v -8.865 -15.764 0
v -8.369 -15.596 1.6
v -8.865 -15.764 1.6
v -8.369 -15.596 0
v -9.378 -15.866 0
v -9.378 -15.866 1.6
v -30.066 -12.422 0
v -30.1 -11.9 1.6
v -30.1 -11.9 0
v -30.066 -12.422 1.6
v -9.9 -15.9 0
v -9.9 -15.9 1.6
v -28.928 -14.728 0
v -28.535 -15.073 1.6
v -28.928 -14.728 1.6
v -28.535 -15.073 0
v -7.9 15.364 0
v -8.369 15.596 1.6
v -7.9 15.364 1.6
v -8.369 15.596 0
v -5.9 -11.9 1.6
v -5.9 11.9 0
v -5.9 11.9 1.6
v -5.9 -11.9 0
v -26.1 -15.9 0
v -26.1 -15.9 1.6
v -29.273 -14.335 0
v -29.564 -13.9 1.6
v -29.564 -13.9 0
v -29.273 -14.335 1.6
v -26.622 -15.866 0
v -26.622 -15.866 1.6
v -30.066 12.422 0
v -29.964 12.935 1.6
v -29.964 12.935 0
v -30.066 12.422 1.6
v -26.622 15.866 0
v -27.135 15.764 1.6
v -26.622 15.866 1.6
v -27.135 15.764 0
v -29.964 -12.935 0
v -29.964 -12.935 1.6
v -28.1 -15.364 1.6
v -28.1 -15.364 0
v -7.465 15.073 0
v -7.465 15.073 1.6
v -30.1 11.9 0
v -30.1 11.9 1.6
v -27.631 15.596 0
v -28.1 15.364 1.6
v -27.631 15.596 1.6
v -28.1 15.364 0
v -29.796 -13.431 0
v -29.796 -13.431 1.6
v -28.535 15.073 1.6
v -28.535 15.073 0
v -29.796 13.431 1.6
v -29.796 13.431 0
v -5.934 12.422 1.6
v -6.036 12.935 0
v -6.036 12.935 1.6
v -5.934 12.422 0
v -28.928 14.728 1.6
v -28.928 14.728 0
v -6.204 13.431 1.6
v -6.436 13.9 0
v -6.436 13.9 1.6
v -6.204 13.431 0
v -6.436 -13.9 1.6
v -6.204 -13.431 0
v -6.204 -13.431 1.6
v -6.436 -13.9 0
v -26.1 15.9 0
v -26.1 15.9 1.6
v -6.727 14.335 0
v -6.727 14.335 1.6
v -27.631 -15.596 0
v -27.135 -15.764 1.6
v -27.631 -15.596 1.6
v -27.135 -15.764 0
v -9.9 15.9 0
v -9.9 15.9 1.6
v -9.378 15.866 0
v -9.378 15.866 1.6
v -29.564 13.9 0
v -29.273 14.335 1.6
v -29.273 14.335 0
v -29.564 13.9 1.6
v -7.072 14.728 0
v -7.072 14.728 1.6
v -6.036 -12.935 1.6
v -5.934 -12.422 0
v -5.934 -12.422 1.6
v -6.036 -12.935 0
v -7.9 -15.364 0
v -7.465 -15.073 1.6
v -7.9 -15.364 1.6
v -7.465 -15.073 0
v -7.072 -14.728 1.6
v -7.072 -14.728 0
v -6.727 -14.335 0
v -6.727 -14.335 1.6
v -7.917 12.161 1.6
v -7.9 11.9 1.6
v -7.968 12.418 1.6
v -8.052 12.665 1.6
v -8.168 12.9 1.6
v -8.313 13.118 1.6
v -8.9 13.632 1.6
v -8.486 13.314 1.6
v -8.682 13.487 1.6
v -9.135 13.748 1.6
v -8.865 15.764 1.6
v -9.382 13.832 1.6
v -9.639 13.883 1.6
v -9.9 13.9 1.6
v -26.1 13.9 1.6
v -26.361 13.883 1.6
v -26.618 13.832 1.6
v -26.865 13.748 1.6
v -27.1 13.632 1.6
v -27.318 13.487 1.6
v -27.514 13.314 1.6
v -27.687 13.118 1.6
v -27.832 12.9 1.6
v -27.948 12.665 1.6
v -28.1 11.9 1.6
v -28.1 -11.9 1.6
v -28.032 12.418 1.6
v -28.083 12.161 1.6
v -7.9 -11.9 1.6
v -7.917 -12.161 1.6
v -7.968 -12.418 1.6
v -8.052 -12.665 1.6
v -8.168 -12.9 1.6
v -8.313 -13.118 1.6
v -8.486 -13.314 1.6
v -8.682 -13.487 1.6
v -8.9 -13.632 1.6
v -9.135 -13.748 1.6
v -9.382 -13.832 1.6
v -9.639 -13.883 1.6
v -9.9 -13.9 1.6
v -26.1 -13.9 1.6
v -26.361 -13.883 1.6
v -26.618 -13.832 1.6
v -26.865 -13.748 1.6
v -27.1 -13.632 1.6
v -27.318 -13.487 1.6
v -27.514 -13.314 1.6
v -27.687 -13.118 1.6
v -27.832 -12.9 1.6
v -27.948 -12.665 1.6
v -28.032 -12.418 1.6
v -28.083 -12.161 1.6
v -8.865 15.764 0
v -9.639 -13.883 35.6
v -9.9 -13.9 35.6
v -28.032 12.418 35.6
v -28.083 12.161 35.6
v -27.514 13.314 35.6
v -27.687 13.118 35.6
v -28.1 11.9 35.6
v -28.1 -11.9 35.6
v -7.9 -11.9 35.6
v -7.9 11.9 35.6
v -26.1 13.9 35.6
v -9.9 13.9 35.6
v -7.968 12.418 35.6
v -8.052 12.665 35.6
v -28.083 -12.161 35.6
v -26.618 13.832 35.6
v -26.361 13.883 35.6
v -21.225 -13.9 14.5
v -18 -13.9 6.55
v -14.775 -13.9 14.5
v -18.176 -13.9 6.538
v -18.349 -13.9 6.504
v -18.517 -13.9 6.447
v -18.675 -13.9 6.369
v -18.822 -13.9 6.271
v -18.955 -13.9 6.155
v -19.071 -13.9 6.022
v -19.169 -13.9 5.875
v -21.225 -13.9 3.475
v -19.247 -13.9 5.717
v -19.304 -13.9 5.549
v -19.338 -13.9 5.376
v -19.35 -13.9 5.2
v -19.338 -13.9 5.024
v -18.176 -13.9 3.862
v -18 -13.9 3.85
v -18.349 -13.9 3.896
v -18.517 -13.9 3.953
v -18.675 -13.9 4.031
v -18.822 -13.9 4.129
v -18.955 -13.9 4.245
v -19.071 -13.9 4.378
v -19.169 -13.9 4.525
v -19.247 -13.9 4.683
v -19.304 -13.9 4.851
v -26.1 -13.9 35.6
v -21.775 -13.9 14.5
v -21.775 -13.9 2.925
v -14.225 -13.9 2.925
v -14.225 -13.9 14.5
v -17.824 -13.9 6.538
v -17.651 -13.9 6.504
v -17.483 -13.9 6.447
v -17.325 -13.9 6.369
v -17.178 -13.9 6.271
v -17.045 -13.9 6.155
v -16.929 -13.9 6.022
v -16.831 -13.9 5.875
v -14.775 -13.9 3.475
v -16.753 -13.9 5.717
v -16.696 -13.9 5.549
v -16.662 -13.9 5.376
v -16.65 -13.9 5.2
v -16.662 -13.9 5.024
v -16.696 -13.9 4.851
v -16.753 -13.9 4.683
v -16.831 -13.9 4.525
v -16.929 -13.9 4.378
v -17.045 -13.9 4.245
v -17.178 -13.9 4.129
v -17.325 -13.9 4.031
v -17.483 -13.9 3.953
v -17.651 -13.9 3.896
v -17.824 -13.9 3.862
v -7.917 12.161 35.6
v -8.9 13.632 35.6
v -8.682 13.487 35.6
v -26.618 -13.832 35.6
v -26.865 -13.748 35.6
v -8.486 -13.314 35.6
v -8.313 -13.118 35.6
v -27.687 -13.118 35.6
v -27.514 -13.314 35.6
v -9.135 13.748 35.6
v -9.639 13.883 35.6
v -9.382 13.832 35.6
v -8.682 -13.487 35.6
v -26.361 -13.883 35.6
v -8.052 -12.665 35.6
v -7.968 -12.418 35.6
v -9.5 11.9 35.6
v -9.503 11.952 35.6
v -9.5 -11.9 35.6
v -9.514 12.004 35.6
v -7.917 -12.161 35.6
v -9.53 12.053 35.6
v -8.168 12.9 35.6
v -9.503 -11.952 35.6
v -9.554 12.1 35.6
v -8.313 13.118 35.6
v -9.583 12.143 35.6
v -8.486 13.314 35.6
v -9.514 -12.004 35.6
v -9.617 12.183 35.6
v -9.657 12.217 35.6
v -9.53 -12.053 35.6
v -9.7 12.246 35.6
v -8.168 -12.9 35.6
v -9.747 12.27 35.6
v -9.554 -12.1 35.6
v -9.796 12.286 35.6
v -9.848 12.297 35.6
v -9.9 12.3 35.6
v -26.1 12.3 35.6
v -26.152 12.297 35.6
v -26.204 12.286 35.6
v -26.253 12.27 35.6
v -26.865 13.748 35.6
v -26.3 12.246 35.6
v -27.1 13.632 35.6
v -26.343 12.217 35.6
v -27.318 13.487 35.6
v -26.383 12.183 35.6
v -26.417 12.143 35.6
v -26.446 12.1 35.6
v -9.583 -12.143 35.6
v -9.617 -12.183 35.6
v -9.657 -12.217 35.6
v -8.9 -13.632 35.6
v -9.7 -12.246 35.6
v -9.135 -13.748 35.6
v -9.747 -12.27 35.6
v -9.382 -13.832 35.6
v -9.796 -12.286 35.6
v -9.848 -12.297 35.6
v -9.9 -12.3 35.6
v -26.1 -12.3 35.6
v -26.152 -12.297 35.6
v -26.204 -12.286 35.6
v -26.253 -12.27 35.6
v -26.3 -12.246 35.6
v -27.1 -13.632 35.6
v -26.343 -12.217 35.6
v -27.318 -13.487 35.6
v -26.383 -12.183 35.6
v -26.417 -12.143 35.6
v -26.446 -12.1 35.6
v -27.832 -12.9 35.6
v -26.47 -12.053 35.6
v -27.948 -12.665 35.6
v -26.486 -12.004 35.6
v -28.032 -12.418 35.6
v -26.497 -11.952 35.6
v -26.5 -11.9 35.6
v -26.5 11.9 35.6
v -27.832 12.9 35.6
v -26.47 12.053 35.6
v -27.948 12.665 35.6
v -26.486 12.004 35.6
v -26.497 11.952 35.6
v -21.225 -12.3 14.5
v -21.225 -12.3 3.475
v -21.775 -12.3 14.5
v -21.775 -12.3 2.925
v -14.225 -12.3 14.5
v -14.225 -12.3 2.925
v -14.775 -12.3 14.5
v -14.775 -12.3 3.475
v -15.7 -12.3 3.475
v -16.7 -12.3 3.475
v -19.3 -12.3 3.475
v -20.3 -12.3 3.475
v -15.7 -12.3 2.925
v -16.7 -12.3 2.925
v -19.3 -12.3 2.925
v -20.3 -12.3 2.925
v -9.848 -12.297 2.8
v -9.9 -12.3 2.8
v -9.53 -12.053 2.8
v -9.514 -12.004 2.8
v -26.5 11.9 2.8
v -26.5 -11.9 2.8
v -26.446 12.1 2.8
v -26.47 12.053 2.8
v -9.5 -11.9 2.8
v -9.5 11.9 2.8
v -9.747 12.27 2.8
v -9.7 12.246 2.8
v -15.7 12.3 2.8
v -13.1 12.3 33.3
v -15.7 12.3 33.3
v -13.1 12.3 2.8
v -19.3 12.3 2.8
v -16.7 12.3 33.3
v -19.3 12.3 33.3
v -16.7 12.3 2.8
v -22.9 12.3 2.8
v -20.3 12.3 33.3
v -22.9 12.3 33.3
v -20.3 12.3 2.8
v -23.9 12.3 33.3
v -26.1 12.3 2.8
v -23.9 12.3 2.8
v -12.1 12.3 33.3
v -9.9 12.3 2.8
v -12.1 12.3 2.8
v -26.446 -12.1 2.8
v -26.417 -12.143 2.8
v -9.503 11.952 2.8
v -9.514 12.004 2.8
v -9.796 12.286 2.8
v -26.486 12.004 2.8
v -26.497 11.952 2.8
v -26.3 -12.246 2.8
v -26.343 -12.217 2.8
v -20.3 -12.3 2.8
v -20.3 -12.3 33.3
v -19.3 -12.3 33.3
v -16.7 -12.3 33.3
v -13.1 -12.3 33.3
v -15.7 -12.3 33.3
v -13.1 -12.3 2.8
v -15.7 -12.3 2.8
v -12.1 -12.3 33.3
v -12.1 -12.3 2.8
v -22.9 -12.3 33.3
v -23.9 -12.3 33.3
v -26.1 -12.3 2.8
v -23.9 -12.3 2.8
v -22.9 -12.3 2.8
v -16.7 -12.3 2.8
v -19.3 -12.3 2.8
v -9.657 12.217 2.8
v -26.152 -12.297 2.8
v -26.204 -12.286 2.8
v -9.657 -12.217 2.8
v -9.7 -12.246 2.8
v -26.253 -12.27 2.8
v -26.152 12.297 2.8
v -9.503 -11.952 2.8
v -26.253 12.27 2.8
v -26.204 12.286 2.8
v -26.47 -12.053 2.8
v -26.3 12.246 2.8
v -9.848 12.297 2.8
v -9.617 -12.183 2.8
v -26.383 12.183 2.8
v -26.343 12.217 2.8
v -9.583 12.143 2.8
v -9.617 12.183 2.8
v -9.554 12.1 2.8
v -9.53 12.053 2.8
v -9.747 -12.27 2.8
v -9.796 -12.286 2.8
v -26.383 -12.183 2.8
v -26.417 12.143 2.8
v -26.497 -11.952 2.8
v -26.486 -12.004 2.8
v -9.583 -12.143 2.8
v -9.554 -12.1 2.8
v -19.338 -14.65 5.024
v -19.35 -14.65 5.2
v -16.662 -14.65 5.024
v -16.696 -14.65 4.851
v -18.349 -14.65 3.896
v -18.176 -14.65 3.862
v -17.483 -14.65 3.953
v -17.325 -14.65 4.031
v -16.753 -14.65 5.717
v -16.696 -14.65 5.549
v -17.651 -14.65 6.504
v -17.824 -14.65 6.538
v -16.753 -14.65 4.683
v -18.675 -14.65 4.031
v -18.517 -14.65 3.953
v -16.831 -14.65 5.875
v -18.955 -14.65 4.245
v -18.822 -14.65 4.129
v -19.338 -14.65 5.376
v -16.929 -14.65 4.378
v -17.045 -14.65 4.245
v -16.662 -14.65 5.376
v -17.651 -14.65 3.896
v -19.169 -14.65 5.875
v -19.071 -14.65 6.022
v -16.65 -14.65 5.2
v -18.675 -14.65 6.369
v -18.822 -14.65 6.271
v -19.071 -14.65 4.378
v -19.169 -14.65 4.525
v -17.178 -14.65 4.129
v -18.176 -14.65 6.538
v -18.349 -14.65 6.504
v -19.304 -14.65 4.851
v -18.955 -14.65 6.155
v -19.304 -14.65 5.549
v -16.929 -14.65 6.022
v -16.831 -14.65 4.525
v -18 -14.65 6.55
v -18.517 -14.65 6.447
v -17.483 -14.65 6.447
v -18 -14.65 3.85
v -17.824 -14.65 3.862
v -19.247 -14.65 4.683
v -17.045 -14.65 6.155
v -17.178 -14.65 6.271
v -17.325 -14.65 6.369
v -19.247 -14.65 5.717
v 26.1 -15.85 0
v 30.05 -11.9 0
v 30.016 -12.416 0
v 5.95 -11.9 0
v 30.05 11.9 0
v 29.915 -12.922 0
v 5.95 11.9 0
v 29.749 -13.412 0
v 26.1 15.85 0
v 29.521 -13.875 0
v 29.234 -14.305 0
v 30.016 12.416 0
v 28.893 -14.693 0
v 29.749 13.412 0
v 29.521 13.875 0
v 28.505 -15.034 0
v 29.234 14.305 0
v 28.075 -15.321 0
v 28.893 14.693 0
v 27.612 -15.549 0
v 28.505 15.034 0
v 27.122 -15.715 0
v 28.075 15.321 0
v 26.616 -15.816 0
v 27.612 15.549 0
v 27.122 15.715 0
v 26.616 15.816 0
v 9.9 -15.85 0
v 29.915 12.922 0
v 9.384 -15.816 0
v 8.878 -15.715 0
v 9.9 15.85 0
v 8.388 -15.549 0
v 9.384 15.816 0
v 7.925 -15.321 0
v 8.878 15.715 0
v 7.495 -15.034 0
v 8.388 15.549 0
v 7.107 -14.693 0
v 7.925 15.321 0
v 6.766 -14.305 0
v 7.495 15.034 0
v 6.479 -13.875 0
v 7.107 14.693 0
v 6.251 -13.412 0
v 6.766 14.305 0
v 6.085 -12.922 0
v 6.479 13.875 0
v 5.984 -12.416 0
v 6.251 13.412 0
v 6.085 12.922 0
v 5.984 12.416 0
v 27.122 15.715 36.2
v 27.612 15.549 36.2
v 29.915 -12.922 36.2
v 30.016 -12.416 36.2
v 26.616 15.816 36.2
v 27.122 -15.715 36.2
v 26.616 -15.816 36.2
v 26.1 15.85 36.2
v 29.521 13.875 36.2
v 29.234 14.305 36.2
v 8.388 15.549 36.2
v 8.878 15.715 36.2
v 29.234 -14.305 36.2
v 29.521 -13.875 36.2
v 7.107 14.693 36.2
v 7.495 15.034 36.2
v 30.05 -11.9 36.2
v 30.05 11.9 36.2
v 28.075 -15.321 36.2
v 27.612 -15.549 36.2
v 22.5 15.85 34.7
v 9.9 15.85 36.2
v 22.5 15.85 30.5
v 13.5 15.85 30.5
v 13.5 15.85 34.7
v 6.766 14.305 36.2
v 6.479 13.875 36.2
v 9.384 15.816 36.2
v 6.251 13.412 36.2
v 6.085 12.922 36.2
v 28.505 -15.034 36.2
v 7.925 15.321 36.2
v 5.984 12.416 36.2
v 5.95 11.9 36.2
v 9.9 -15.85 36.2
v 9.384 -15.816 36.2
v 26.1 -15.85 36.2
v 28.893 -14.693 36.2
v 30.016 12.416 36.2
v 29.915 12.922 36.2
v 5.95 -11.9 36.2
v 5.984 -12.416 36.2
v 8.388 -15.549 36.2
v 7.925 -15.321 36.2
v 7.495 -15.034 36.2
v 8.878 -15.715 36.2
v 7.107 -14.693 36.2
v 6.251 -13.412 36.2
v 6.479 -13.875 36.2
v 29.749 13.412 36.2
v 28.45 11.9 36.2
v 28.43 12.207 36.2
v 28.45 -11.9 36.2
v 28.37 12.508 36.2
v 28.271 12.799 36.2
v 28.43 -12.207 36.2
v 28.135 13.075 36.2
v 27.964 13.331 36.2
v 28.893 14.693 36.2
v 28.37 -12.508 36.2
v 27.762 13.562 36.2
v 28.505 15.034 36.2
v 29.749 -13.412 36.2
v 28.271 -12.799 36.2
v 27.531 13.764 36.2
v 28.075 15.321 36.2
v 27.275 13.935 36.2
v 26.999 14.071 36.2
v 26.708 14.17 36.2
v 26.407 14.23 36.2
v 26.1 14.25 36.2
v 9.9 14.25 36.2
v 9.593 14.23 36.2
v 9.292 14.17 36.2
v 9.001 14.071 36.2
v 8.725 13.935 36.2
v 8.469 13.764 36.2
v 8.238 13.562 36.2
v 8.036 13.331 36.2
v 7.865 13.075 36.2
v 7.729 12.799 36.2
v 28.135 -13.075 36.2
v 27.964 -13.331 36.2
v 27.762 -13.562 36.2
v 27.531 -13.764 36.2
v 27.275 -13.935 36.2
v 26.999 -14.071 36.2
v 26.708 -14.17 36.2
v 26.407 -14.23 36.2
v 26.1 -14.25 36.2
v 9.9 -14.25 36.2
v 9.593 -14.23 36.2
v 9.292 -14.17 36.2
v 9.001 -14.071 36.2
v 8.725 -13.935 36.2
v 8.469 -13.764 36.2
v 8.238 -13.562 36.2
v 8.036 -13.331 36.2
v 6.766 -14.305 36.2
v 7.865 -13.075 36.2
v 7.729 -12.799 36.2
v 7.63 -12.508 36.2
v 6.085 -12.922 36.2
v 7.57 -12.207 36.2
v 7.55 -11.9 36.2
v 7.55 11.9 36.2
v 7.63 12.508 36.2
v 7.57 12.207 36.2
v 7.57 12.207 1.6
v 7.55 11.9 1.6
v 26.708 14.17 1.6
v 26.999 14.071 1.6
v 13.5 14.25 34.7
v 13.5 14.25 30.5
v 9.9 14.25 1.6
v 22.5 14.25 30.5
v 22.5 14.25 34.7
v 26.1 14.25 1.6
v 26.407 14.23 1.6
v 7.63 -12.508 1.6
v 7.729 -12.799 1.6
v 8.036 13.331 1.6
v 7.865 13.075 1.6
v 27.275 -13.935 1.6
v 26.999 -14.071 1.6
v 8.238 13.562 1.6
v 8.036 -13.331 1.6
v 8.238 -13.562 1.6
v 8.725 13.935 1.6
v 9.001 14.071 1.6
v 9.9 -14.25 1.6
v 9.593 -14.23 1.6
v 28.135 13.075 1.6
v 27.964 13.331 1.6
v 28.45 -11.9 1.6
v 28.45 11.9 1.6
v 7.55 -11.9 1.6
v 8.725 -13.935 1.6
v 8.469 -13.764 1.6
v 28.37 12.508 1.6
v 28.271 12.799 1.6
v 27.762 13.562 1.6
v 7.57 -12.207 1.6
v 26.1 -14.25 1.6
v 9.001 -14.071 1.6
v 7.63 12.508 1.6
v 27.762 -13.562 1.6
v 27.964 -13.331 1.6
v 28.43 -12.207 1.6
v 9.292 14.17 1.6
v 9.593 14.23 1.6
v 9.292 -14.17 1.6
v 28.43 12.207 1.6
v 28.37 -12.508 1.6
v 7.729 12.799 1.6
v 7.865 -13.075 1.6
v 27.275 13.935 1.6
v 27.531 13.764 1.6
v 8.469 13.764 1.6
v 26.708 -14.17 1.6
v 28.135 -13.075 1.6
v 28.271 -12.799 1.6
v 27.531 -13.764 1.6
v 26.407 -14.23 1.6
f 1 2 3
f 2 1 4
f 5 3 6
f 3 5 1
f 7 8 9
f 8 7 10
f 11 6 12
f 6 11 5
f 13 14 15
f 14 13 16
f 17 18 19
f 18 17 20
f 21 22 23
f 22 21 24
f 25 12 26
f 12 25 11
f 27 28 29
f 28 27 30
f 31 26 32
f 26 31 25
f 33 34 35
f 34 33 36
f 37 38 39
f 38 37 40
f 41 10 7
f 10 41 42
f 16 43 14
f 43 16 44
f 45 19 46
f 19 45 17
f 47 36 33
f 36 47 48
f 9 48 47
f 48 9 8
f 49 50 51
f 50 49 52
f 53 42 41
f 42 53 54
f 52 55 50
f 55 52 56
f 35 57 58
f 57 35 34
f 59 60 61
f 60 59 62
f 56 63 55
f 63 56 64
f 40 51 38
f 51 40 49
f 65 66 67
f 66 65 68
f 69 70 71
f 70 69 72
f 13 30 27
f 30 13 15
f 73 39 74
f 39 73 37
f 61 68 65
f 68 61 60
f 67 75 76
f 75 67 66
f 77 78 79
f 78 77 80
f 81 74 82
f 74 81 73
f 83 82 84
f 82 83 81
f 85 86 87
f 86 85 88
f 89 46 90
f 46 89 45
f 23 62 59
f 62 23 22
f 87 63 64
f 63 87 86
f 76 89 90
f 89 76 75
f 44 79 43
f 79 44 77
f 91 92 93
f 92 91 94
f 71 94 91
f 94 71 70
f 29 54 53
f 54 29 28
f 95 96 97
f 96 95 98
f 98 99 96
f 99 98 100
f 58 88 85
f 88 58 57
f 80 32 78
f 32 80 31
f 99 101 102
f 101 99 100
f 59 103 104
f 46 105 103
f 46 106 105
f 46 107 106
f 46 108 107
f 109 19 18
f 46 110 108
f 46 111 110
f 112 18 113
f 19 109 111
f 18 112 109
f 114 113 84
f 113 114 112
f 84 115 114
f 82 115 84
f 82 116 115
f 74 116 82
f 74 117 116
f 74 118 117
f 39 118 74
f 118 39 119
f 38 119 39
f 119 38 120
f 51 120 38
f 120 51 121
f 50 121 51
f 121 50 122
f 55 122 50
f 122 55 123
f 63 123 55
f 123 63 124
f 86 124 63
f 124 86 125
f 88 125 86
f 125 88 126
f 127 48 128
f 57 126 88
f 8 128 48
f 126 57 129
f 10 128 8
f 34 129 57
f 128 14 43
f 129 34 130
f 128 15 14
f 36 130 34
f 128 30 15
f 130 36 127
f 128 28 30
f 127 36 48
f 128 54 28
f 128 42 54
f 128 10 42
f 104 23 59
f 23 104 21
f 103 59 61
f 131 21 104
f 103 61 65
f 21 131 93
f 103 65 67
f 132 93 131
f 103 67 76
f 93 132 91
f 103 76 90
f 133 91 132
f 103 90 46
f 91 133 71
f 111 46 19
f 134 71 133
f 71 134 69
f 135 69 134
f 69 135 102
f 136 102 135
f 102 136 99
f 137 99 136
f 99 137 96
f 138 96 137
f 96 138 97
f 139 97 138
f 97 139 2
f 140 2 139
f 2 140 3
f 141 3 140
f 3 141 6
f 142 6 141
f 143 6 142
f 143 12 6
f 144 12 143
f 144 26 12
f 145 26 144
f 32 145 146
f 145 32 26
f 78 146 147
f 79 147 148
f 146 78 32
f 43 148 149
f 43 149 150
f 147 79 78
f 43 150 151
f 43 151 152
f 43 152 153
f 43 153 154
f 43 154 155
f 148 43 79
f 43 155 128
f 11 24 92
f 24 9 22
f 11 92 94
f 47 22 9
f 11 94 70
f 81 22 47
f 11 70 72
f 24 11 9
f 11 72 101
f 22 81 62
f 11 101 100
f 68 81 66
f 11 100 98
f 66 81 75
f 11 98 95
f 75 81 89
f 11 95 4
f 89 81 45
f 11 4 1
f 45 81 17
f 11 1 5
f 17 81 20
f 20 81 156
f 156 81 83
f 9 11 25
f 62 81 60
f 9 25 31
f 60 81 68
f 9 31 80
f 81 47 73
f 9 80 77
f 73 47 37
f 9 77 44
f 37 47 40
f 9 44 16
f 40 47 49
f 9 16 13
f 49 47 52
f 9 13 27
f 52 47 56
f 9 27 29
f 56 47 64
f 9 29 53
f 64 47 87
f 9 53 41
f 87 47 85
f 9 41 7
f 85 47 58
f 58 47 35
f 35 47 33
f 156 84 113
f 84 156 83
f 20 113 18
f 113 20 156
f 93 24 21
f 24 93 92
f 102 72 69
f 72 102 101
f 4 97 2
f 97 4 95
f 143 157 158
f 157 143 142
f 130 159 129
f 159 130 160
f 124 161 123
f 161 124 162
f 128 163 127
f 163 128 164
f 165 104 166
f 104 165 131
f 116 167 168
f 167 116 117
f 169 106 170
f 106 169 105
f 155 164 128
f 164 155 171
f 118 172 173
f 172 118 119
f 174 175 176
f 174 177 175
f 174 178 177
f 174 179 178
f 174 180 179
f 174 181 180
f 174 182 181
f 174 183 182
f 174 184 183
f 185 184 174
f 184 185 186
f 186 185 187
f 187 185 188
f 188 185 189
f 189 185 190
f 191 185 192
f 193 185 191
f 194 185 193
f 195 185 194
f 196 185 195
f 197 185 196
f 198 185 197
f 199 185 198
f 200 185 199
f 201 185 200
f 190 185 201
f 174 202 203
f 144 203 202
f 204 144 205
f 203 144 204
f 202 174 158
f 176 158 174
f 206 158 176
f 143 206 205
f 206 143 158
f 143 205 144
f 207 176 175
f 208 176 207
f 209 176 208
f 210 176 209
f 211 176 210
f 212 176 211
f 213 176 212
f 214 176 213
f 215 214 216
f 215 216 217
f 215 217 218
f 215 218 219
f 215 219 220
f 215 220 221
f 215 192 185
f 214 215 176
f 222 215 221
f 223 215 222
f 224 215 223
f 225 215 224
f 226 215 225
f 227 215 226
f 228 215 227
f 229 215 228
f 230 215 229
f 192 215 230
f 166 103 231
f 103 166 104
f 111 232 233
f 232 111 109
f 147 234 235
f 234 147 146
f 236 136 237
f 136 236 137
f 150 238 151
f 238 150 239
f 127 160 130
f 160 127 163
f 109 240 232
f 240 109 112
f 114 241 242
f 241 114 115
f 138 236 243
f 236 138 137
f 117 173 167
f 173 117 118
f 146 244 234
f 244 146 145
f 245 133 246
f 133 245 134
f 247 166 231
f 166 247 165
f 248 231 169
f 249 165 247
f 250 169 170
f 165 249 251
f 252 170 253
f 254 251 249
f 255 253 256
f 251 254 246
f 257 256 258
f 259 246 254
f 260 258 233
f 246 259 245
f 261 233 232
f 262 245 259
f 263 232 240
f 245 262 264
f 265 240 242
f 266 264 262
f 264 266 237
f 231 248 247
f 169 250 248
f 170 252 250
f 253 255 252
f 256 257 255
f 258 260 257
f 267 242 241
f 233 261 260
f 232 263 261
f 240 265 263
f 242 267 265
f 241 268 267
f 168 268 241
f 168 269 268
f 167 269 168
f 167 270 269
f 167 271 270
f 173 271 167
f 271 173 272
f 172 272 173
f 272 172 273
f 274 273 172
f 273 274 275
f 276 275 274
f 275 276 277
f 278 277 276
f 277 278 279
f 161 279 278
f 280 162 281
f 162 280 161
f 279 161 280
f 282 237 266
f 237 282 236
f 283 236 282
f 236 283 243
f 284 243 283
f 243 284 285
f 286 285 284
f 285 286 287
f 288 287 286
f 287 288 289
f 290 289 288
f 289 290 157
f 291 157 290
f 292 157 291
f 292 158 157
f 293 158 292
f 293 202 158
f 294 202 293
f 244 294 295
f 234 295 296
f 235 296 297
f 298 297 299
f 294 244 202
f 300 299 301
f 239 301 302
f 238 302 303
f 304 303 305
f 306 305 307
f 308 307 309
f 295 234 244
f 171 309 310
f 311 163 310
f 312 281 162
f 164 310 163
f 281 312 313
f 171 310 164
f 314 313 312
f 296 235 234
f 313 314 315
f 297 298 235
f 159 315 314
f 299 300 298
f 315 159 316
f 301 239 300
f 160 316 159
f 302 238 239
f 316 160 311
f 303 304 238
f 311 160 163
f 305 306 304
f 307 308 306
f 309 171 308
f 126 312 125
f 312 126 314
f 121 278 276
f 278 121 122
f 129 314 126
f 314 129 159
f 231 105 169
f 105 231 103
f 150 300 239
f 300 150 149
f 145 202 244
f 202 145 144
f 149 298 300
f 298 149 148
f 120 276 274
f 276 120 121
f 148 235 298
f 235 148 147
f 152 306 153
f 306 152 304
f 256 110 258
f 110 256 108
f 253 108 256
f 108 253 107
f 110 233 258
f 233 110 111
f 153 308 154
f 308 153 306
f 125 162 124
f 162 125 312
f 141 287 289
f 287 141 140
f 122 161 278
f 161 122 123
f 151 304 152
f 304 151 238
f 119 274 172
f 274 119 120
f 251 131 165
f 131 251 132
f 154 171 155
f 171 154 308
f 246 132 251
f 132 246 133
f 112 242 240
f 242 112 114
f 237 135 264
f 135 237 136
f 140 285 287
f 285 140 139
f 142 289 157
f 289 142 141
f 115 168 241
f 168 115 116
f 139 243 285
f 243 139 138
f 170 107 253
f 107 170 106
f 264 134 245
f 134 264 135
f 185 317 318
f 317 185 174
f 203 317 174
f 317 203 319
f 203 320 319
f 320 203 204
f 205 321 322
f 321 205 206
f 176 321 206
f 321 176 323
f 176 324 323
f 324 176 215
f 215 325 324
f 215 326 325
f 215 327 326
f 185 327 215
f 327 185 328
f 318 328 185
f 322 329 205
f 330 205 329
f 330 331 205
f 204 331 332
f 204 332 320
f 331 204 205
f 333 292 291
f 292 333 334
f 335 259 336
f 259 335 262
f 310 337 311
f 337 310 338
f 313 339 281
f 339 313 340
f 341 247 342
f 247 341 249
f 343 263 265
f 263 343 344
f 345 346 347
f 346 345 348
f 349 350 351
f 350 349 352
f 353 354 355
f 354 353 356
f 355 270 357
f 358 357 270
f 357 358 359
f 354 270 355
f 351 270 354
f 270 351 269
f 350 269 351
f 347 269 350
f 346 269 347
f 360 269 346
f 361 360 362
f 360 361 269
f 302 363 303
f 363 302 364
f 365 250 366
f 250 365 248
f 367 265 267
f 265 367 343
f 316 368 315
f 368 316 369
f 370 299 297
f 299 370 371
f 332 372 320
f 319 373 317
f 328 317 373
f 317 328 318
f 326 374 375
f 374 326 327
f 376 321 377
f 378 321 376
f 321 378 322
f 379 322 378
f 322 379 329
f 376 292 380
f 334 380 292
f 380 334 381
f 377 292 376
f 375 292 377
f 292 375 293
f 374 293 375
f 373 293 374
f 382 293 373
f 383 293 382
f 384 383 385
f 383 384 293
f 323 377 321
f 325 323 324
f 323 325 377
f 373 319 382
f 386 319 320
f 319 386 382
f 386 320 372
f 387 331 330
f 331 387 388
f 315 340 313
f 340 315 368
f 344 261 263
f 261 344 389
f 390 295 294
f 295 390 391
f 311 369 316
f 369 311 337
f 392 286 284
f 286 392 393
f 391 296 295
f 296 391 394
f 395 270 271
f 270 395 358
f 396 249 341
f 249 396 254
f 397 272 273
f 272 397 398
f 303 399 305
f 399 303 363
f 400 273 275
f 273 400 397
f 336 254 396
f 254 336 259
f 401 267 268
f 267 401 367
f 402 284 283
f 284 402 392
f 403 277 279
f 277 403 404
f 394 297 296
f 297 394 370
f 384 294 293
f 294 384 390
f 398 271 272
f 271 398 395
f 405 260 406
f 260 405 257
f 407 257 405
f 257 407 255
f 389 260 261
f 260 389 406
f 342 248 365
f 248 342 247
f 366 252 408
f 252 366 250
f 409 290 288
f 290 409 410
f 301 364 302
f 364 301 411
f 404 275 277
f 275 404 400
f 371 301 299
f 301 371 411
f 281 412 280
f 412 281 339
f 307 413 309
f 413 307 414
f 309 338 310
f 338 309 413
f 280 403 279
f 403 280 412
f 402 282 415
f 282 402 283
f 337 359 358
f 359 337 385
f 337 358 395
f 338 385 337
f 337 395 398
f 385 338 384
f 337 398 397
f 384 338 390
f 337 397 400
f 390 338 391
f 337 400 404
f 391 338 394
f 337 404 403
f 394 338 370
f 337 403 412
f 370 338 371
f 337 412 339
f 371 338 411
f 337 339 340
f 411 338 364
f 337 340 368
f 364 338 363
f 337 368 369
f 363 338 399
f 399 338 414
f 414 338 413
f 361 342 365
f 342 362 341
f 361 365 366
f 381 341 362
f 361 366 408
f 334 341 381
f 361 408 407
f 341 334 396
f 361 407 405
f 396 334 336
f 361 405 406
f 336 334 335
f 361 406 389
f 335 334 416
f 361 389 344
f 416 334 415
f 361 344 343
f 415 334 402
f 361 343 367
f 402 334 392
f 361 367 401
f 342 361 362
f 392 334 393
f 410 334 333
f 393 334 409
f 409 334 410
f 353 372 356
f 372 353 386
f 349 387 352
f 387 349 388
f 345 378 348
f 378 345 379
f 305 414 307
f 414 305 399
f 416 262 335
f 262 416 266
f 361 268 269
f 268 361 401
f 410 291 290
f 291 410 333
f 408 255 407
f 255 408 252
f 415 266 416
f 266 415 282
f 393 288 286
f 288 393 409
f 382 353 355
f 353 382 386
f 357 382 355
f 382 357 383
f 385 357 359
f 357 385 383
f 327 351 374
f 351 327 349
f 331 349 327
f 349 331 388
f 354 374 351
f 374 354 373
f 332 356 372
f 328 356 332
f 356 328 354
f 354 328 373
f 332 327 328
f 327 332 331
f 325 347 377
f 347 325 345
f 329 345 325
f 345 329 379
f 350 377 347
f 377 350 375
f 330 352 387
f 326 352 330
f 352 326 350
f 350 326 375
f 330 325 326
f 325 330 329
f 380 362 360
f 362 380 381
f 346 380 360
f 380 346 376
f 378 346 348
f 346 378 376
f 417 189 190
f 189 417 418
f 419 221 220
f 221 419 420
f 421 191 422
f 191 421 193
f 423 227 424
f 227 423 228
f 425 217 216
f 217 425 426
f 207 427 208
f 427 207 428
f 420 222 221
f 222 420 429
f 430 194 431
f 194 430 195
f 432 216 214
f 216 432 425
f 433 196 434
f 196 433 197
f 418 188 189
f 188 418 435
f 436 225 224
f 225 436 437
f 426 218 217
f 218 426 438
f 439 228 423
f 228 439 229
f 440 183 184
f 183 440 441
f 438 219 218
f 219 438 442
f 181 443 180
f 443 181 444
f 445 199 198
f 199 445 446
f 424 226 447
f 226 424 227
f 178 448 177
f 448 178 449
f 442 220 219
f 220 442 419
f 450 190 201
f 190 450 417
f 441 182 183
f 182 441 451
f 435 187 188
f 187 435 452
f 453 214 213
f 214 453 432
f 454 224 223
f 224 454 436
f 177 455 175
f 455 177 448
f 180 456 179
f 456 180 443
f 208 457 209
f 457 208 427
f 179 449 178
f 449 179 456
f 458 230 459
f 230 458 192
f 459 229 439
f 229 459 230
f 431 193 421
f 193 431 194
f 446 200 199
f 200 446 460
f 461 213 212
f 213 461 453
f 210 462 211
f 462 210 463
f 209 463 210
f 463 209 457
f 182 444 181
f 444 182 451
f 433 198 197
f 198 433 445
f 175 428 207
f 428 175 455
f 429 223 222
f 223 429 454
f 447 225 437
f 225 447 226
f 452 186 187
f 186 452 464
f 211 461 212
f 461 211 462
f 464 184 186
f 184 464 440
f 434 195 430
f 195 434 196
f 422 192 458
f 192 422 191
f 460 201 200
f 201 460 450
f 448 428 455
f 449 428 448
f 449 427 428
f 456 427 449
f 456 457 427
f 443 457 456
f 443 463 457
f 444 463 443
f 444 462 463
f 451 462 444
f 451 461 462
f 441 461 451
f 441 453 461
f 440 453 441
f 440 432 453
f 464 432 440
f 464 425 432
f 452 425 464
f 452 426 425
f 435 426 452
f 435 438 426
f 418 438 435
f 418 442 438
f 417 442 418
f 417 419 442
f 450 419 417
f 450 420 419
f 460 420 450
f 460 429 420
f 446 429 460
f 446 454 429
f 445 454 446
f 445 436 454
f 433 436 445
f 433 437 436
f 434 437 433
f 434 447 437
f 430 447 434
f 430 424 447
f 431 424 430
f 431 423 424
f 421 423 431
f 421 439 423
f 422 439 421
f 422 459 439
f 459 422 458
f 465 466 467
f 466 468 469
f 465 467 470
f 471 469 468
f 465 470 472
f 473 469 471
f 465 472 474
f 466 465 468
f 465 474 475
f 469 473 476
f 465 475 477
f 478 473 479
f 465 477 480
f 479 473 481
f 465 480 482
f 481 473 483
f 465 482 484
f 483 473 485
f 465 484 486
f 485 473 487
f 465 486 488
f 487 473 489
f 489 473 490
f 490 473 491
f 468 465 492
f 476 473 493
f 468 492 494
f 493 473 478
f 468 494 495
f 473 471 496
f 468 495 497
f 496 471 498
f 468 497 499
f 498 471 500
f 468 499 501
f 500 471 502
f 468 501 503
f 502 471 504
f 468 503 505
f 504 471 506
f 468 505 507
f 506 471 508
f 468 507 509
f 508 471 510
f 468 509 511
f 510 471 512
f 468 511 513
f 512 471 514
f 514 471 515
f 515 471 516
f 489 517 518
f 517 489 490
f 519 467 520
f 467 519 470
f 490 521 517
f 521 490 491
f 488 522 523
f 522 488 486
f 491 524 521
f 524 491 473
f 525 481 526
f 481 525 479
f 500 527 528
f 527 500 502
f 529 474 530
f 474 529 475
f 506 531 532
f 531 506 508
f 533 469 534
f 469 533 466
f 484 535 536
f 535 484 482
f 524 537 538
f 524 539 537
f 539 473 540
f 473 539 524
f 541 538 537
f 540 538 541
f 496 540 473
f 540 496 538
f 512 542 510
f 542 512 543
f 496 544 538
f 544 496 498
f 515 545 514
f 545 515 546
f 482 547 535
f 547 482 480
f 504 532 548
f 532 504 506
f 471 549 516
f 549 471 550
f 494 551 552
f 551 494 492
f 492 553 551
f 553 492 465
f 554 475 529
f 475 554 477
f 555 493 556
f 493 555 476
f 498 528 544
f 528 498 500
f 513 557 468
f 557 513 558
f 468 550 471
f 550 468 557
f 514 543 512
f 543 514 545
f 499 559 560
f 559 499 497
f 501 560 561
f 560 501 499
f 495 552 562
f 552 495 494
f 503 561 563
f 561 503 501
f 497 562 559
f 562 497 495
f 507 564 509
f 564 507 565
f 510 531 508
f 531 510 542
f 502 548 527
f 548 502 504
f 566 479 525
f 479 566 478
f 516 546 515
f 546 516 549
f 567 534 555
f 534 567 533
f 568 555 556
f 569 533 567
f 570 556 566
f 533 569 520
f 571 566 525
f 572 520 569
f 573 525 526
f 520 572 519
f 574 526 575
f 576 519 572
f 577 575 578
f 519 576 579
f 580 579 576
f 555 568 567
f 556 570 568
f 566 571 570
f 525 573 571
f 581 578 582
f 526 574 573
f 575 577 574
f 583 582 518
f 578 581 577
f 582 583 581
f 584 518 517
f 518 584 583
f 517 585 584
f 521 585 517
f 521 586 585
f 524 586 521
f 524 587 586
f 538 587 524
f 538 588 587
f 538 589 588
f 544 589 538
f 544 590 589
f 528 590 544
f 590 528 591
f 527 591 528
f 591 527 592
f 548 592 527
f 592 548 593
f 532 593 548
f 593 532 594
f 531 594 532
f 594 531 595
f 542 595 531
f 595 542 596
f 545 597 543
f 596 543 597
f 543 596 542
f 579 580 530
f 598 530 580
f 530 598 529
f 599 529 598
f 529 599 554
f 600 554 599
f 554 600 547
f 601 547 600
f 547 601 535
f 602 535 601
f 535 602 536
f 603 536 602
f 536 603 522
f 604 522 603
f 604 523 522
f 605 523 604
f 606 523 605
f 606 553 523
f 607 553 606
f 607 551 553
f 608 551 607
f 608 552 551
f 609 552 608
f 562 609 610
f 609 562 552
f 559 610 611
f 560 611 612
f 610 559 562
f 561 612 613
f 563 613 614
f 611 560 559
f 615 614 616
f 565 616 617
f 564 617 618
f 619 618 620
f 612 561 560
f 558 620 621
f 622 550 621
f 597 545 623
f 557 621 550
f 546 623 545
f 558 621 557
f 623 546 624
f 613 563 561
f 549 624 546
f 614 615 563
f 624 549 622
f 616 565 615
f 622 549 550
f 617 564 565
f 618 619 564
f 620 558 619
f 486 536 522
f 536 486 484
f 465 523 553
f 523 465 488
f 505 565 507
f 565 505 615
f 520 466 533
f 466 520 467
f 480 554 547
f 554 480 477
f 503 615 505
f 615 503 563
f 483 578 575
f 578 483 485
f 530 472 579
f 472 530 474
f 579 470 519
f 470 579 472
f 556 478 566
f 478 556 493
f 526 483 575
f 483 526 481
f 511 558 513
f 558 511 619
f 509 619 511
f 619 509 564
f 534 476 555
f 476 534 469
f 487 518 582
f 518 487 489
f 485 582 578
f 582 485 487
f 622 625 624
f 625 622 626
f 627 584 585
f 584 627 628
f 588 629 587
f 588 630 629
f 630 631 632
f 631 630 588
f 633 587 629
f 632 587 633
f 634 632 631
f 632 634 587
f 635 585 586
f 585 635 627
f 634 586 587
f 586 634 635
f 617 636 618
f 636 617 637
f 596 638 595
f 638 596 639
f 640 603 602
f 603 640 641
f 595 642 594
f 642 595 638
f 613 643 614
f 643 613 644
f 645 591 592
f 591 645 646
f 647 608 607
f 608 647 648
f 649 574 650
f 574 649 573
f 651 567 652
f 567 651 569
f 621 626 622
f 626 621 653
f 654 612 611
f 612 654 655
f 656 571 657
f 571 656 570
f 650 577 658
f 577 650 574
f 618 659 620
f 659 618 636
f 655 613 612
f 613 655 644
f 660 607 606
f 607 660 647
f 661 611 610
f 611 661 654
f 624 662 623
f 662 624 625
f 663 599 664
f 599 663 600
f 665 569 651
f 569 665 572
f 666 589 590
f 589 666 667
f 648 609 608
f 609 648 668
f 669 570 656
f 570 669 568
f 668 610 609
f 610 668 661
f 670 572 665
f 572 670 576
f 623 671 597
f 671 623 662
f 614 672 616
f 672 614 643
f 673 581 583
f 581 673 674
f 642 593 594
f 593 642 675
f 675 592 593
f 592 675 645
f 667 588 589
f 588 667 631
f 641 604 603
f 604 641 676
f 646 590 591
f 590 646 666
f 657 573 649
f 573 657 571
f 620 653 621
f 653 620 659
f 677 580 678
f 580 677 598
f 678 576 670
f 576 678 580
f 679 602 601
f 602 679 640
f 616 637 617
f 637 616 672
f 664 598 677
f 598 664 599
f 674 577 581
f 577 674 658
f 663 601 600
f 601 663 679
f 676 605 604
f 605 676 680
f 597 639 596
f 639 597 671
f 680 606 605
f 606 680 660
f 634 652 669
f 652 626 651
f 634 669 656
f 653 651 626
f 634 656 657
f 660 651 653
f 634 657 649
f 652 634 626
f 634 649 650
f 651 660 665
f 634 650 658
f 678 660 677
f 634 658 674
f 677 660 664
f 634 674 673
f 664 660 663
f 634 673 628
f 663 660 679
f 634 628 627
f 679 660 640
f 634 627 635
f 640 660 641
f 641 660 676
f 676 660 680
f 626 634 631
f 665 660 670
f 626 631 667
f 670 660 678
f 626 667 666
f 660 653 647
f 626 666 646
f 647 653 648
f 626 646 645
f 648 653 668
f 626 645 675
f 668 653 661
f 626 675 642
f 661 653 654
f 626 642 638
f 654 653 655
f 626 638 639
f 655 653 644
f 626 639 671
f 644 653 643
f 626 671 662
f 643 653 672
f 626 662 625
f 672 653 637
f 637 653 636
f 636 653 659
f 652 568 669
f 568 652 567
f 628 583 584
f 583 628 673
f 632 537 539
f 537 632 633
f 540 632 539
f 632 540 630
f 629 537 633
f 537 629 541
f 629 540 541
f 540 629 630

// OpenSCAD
$fn = 48;
part_id = 0; // 0 plate, 1 tray, 2 sleeve, 3 assembled, 4 exploded, 5 collision, 6 latch coupon

card_count = 5;
card_dimensions = [24, 32, 2.1]; // width, height, thickness

slot_clearance = 0.25;
card_side_clearance = 0.30;
divider_thickness = 1.0;
divider_embed = 0.3;
wall = 1.6;
floor_thickness = 1.2;
flange_thickness = 1.6;
flange_overhang = 2.0;
card_top_clearance = 0.8;
corner_radius = 2.0;

sleeve_clearance = 0.35;
sleeve_wall = 1.6;
sleeve_roof = 1.6;
sleeve_top_clearance = 0.6;

tongue_width = 7.0;
tongue_slit = 0.55;
tongue_bottom = 3.2;
tongue_anchor = 14.5;
bump_radius = 1.35;
bump_projection = 0.75;
bump_embed = 0.8;
bump_z = 5.2;
window_width = 9.0;
window_height = 4.2;

card_width = card_dimensions[0];
card_height = card_dimensions[1];
card_thickness = card_dimensions[2];
slot_width = card_thickness + 2 * slot_clearance;
inner_width = card_count * slot_width + (card_count - 1) * divider_thickness;
inner_depth = card_width + 2 * card_side_clearance;
tray_width = inner_width + 2 * wall;
tray_depth = inner_depth + 2 * wall;
floor_z = flange_thickness + floor_thickness;
tray_height = floor_z + card_height + card_top_clearance;

sleeve_inner_width = tray_width + 2 * sleeve_clearance;
sleeve_inner_depth = tray_depth + 2 * sleeve_clearance;
sleeve_outer_width = sleeve_inner_width + 2 * sleeve_wall;
sleeve_outer_depth = sleeve_inner_depth + 2 * sleeve_wall;
sleeve_inner_top = tray_height + sleeve_top_clearance;
sleeve_top = sleeve_inner_top + sleeve_roof;

eps = 0.05;

module rounded_prism(width, depth, height, radius) {
    linear_extrude(height)
        offset(r=radius)
            square([width - 2 * radius, depth - 2 * radius], center=true);
}

module tongue_cutouts() {
    front_y = -tray_depth / 2 - eps;
    cut_depth = wall + 2 * eps;
    for (side = [-1, 1])
        translate([
            side * tongue_width / 2 - tongue_slit / 2,
            front_y,
            tongue_bottom
        ])
            cube([tongue_slit, cut_depth, tongue_anchor - tongue_bottom]);

    translate([
        -tongue_width / 2 - tongue_slit / 2,
        front_y,
        tongue_bottom - tongue_slit / 2
    ])
        cube([tongue_width + tongue_slit, cut_depth, tongue_slit]);
}

module finger_scoop_cut() {
    translate([0, -tray_depth / 2 - eps, tray_height])
        rotate([90, 0, 0])
            cylinder(h=wall + 2 * eps, r=5.2);
}

module tray_shell() {
    difference() {
        union() {
            rounded_prism(
                tray_width + 2 * flange_overhang,
                tray_depth + 2 * flange_overhang,
                flange_thickness,
                corner_radius + flange_overhang
            );
            rounded_prism(tray_width, tray_depth, tray_height, corner_radius);
        }

        translate([0, 0, floor_z])
            rounded_prism(
                tray_width - 2 * wall,
                tray_depth - 2 * wall,
                tray_height - floor_z + eps,
                max(corner_radius - wall, 0.4)
            );
        tongue_cutouts();
        finger_scoop_cut();
    }
}

module dividers() {
    divider_height = card_height - 1.5;
    for (index = [1 : card_count - 1]) {
        x = -inner_width / 2 + index * slot_width + (index - 1) * divider_thickness;
        translate([x, -inner_depth / 2, floor_z - divider_embed])
            cube([divider_thickness, inner_depth, divider_height + divider_embed]);
    }
}

module latch_bump() {
    translate([0, -tray_depth / 2 + bump_embed, bump_z])
        rotate([90, 0, 0])
            cylinder(h=bump_projection + bump_embed, r=bump_radius);
}

module tray() {
    union() {
        tray_shell();
        dividers();
        latch_bump();
    }
}

module sleeve_window_cut() {
    translate([
        -window_width / 2,
        -sleeve_outer_depth / 2 - eps,
        bump_z - window_height / 2
    ])
        cube([window_width, sleeve_wall + 2 * eps, window_height]);
}

module sleeve() {
    difference() {
        translate([0, 0, flange_thickness])
            rounded_prism(
                sleeve_outer_width,
                sleeve_outer_depth,
                sleeve_top - flange_thickness,
                corner_radius + sleeve_clearance + sleeve_wall
            );
        translate([0, 0, flange_thickness - eps])
            rounded_prism(
                sleeve_inner_width,
                sleeve_inner_depth,
                sleeve_inner_top - flange_thickness + eps,
                corner_radius + sleeve_clearance
            );
        sleeve_window_cut();
    }
}

module sleeve_print() {
    translate([0, 0, sleeve_top])
        rotate([180, 0, 0])
            sleeve();
}

module card_dummy(index) {
    x = -inner_width / 2
        + index * (slot_width + divider_thickness)
        + slot_width / 2;
    color(index % 2 == 0 ? "midnightblue" : "slategray")
        translate([x - card_thickness / 2, -card_width / 2, floor_z])
            cube([card_thickness, card_width, card_height]);
}

module assembly(show_cards=true) {
    color("gold") tray();
    color("deepskyblue", 0.38) sleeve();
    if (show_cards)
        for (index = [0 : card_count - 1]) card_dummy(index);
}

module exploded() {
    color("gold") tray();
    color("deepskyblue", 0.55)
        translate([0, 0, tray_height + 8]) sleeve();
    for (index = [0 : card_count - 1]) card_dummy(index);
}

module latch_coupon() {
    // Exact production latch section, shortened to reduce preflight cost.
    intersection() {
        tray();
        translate([-7, -tray_depth / 2 - flange_overhang - 1, 0])
            cube([14, wall + flange_overhang + 4, 18]);
    }
    translate([20, 0, -flange_thickness])
        union() {
            intersection() {
                sleeve();
                translate([-7, -sleeve_outer_depth / 2 - 1, flange_thickness])
                    cube([14, sleeve_wall + 4, 13]);
            }
            translate([-7, -sleeve_outer_depth / 2 - 1, flange_thickness])
                cube([14, sleeve_wall + 4, 1.2]);
        }
}

if (part_id == 1) {
    tray();
} else if (part_id == 2) {
    sleeve_print();
} else if (part_id == 3) {
    assembly(true);
} else if (part_id == 4) {
    exploded();
} else if (part_id == 5) {
    intersection() {
        tray();
        sleeve();
    }
} else if (part_id == 6) {
    latch_coupon();
} else {
    translate([-18, 0, 0]) tray();
    translate([18, 0, 0]) sleeve_print();
}
